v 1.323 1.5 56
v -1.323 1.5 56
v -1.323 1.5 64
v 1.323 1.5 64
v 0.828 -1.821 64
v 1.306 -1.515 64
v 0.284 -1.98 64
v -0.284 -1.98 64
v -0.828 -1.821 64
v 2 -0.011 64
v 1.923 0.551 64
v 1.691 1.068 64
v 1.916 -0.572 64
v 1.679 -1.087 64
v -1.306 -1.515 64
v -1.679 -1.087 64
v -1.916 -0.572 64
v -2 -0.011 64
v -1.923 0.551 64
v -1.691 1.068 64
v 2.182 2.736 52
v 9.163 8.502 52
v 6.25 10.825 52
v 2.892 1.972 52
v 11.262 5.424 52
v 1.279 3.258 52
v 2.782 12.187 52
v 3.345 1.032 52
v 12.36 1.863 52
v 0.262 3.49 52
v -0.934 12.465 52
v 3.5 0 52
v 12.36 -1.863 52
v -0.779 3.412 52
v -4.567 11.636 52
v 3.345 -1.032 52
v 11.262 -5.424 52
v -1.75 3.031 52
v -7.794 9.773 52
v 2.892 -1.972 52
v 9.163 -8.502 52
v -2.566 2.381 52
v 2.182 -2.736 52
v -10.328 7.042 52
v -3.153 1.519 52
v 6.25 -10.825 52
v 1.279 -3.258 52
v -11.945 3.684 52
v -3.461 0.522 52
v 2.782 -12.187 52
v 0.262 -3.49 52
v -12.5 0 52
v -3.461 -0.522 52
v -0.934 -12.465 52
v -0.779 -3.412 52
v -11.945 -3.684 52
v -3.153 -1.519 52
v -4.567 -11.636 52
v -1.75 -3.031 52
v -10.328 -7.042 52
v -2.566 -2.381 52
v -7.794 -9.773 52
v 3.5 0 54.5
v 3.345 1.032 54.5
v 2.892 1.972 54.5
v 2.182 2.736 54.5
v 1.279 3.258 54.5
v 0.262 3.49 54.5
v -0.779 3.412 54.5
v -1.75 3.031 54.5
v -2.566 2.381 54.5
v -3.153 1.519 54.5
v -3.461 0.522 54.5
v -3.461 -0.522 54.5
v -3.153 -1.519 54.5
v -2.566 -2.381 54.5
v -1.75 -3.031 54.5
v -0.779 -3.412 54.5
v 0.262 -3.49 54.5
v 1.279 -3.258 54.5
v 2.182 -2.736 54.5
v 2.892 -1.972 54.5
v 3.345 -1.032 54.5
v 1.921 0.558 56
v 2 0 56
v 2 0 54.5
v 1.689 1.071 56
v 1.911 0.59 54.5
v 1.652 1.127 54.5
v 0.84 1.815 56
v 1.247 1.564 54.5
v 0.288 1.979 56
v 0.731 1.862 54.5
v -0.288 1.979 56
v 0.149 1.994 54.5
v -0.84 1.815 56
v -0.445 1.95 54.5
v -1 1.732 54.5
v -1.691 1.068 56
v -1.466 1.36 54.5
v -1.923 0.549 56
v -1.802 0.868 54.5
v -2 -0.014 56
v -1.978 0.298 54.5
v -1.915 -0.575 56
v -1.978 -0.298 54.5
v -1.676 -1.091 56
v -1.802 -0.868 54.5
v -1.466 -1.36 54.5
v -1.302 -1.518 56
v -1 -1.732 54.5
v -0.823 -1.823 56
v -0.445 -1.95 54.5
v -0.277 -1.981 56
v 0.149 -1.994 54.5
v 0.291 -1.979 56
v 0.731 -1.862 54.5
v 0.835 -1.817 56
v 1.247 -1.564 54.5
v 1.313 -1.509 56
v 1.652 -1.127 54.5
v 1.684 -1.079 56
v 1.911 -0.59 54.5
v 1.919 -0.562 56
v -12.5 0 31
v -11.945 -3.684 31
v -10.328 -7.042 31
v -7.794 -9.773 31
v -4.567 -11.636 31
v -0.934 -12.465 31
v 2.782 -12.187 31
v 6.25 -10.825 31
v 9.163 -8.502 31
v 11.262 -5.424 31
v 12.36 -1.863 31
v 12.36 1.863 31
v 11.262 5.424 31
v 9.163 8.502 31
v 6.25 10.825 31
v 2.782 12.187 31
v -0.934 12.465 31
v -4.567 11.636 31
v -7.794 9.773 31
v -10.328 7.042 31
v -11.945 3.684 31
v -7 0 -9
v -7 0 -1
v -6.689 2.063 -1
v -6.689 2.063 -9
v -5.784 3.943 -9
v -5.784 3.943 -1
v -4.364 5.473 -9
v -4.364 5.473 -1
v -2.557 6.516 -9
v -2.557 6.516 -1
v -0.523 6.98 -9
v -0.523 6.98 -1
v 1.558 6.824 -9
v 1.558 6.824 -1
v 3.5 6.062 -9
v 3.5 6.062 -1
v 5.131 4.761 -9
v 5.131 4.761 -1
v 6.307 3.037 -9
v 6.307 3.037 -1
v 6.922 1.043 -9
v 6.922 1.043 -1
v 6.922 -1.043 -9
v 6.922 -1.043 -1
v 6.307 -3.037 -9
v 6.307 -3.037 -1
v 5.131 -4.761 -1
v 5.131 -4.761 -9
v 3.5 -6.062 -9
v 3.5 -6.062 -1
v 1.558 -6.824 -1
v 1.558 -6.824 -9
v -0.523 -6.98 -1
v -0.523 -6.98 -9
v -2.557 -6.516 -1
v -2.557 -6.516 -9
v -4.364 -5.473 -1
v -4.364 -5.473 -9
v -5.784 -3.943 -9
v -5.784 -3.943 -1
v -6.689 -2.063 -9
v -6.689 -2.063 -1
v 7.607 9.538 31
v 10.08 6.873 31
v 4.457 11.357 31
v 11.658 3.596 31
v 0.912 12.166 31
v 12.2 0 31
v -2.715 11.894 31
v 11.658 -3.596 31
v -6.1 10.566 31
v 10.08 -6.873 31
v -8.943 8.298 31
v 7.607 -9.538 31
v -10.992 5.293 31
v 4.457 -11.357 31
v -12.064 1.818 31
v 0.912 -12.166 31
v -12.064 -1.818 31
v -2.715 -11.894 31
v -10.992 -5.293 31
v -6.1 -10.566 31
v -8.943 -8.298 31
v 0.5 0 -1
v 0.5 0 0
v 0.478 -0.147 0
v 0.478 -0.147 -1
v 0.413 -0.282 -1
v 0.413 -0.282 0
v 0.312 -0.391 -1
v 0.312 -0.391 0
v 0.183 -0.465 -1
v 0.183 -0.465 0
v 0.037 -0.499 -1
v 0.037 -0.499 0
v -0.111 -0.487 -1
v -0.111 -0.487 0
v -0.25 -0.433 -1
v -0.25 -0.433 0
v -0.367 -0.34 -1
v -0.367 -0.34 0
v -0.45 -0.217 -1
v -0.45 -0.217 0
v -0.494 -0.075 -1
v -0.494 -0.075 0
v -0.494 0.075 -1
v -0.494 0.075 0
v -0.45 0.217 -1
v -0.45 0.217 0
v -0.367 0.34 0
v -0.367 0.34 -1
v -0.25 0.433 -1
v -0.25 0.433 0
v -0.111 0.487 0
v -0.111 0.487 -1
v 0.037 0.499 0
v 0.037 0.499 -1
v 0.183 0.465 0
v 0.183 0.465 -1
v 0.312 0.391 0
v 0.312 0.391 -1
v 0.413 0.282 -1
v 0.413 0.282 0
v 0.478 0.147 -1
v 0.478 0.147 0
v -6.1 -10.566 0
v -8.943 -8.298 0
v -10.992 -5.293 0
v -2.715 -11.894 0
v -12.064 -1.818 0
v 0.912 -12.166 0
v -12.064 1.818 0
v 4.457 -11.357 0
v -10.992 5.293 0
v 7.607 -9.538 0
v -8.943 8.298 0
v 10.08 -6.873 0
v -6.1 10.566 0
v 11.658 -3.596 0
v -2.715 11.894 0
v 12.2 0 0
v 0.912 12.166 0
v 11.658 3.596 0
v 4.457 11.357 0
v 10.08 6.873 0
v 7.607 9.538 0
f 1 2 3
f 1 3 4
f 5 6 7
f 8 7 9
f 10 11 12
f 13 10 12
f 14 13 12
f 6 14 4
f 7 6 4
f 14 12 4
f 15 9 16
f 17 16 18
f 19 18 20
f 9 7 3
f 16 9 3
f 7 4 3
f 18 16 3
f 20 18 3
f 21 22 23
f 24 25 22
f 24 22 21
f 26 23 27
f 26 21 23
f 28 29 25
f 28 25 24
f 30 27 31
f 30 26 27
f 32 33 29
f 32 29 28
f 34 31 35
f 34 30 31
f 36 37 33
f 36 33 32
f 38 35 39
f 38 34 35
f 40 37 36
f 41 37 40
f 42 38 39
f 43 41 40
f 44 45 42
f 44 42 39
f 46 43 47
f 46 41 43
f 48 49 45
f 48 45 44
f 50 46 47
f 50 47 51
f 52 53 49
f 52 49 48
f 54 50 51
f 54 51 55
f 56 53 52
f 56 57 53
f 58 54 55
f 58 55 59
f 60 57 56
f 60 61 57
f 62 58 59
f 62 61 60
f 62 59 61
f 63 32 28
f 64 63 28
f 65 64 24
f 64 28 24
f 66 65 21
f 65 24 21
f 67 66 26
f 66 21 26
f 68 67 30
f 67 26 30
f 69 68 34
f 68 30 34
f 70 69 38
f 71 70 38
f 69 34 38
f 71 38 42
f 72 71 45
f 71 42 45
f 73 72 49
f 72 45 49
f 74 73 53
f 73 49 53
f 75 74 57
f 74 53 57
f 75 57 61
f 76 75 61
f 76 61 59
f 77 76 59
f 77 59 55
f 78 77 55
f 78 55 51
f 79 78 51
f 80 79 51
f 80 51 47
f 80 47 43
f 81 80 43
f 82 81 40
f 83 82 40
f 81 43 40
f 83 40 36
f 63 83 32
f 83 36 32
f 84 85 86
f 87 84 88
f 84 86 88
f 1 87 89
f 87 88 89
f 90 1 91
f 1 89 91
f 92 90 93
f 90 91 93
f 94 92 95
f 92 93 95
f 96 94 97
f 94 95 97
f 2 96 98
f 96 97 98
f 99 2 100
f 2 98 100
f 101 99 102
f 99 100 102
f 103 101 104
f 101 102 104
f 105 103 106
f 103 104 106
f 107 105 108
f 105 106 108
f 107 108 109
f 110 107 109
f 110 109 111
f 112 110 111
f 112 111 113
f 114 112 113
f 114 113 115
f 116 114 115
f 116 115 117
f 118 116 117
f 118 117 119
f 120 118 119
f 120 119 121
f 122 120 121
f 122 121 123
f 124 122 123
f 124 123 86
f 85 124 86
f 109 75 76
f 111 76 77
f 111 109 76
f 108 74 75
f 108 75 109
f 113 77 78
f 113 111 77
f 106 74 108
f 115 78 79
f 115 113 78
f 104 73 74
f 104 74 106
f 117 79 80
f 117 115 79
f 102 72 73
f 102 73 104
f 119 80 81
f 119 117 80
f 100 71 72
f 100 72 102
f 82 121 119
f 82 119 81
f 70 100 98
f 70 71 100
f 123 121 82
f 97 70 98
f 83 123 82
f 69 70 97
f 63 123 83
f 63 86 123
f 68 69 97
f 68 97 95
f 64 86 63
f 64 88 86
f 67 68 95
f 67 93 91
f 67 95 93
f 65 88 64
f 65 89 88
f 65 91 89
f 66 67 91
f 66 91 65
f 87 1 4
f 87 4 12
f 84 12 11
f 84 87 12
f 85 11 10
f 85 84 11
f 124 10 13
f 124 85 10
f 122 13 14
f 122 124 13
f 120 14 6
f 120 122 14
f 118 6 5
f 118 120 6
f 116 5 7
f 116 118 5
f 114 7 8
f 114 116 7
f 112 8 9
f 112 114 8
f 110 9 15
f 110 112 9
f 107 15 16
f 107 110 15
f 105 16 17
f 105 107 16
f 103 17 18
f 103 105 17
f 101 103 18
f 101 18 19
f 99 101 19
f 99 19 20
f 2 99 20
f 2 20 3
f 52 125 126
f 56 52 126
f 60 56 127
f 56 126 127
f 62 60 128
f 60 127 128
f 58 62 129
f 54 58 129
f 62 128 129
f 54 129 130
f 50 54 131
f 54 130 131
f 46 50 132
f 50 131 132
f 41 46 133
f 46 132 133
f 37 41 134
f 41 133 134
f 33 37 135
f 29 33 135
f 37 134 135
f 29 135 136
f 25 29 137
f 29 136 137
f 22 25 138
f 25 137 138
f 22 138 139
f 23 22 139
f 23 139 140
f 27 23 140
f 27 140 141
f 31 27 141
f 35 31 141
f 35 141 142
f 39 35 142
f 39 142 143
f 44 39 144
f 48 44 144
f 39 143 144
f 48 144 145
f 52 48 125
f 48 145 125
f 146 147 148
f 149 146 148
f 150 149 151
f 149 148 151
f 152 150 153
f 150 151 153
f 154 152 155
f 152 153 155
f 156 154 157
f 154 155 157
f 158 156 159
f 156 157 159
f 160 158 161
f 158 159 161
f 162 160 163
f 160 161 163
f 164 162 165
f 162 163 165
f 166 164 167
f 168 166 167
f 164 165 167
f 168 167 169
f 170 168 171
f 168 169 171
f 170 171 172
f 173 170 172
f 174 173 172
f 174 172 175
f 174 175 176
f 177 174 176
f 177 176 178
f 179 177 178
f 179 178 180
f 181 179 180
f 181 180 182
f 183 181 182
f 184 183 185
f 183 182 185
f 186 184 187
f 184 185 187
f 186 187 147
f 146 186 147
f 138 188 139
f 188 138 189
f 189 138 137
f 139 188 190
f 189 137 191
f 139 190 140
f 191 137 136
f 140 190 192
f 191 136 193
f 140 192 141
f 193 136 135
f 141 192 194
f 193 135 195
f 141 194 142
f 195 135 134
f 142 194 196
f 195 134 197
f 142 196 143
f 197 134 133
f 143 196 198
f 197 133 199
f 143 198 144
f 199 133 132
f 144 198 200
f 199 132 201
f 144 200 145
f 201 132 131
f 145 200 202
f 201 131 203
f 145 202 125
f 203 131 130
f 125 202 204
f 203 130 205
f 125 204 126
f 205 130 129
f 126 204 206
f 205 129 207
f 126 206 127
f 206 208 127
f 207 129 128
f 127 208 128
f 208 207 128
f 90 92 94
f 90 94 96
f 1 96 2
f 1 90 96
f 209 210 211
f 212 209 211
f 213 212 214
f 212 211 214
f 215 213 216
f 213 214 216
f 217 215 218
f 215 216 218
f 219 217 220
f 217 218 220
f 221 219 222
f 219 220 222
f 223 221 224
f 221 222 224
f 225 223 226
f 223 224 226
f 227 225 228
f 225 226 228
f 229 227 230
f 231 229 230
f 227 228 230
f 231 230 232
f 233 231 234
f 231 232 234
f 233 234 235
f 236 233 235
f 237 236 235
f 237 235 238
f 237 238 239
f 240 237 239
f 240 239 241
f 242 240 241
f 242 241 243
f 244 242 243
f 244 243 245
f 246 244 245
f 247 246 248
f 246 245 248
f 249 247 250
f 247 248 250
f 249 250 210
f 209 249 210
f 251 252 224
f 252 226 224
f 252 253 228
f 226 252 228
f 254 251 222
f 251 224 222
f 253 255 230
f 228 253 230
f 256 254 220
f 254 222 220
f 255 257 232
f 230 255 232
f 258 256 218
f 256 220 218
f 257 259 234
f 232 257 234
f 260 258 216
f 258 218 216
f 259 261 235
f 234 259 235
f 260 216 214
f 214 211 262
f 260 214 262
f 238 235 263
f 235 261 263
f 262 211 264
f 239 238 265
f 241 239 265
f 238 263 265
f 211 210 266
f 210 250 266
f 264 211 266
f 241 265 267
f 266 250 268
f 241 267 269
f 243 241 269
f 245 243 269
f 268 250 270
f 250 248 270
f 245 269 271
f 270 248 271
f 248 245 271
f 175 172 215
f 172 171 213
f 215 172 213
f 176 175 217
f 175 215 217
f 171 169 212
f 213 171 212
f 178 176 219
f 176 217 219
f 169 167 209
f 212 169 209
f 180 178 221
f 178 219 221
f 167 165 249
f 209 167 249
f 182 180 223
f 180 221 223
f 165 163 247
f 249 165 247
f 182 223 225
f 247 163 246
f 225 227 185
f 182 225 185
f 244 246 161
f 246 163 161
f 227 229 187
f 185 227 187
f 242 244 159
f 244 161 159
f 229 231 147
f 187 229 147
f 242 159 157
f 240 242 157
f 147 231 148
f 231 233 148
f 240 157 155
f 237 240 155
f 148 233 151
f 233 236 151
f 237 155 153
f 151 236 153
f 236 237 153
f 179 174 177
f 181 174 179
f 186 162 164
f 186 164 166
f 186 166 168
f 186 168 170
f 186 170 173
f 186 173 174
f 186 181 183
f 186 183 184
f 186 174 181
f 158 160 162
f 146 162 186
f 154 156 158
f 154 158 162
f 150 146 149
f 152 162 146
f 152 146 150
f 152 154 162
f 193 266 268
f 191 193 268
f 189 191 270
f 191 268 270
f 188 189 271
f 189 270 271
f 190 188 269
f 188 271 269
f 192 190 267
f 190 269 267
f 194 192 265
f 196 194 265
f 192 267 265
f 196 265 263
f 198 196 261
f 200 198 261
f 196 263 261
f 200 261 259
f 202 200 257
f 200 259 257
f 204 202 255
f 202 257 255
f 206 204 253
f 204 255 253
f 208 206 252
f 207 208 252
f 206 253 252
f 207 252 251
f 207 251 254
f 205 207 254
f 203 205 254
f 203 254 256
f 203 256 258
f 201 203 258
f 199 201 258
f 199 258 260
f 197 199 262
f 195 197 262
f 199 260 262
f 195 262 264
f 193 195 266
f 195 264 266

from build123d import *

# Parameters (mm, degrees)
SKETCH1_R           = 12.2
BOSS_EXTRUDE1_DEPTH = 31
SKETCH2_R           = 12.5
BOSS_EXTRUDE2_DEPTH = 21
SKETCH3_R           = 3.5
BOSS_EXTRUDE3_DEPTH = 2.5
SKETCH4_R           = 2
BOSS_EXTRUDE5_DEPTH = 1.5
BOSS_EXTRUDE6_DEPTH = 8
SKETCH6_R           = 0.5
BOSS_EXTRUDE7_DEPTH = 1
SKETCH7_R           = 7
BOSS_EXTRUDE8_DEPTH = 8


with BuildPart() as part:
    # Sketch1 → Boss-Extrude1 (new body)
    with BuildSketch(Plane.XY):
        Circle(SKETCH1_R)
    extrude(amount=BOSS_EXTRUDE1_DEPTH)

    # Sketch2 → Boss-Extrude2 (add)
    with BuildSketch(Plane.XY.offset(31)):
        with Locations(Location((0, 0, 0), (0, 0, 180))):
            Circle(SKETCH2_R)
    extrude(amount=BOSS_EXTRUDE2_DEPTH)

    # Sketch3 → Boss-Extrude3 (add)
    with BuildSketch(Plane.XY.offset(52)):
        Circle(SKETCH3_R)
    extrude(amount=BOSS_EXTRUDE3_DEPTH)

    # Sketch4 → Boss-Extrude5 (add)
    with BuildSketch(Plane.XY.offset(54.5)):
        Circle(SKETCH4_R)
    extrude(amount=BOSS_EXTRUDE5_DEPTH)

    # Sketch5 → Boss-Extrude6 (add)
    with BuildSketch(Plane.XY.offset(56)):
        with BuildLine():
            Line((0, 1.5), (1.322875656, 1.5))
            ThreePointArc((1.322875656, 1.5), (0, -2), (-1.322875656, 1.5))
            Line((-1.322875656, 1.5), (0, 1.5))
        make_face()
    extrude(amount=BOSS_EXTRUDE6_DEPTH)

    # Sketch6 → Boss-Extrude7 (add)
    with BuildSketch(Plane(origin=(0, 0, 0), x_dir=(-1, 0, 0), z_dir=(0, 0, -1))):
        with Locations(Location((0, 0, 0), (0, 0, 180))):
            Circle(SKETCH6_R)
    extrude(amount=BOSS_EXTRUDE7_DEPTH)

    # Sketch7 → Boss-Extrude8 (add)
    with BuildSketch(Plane(origin=(0, 0, -1), x_dir=(-1, 0, 0), z_dir=(0, 0, -1))):
        Circle(SKETCH7_R)
    extrude(amount=BOSS_EXTRUDE8_DEPTH)


solid = part.part
